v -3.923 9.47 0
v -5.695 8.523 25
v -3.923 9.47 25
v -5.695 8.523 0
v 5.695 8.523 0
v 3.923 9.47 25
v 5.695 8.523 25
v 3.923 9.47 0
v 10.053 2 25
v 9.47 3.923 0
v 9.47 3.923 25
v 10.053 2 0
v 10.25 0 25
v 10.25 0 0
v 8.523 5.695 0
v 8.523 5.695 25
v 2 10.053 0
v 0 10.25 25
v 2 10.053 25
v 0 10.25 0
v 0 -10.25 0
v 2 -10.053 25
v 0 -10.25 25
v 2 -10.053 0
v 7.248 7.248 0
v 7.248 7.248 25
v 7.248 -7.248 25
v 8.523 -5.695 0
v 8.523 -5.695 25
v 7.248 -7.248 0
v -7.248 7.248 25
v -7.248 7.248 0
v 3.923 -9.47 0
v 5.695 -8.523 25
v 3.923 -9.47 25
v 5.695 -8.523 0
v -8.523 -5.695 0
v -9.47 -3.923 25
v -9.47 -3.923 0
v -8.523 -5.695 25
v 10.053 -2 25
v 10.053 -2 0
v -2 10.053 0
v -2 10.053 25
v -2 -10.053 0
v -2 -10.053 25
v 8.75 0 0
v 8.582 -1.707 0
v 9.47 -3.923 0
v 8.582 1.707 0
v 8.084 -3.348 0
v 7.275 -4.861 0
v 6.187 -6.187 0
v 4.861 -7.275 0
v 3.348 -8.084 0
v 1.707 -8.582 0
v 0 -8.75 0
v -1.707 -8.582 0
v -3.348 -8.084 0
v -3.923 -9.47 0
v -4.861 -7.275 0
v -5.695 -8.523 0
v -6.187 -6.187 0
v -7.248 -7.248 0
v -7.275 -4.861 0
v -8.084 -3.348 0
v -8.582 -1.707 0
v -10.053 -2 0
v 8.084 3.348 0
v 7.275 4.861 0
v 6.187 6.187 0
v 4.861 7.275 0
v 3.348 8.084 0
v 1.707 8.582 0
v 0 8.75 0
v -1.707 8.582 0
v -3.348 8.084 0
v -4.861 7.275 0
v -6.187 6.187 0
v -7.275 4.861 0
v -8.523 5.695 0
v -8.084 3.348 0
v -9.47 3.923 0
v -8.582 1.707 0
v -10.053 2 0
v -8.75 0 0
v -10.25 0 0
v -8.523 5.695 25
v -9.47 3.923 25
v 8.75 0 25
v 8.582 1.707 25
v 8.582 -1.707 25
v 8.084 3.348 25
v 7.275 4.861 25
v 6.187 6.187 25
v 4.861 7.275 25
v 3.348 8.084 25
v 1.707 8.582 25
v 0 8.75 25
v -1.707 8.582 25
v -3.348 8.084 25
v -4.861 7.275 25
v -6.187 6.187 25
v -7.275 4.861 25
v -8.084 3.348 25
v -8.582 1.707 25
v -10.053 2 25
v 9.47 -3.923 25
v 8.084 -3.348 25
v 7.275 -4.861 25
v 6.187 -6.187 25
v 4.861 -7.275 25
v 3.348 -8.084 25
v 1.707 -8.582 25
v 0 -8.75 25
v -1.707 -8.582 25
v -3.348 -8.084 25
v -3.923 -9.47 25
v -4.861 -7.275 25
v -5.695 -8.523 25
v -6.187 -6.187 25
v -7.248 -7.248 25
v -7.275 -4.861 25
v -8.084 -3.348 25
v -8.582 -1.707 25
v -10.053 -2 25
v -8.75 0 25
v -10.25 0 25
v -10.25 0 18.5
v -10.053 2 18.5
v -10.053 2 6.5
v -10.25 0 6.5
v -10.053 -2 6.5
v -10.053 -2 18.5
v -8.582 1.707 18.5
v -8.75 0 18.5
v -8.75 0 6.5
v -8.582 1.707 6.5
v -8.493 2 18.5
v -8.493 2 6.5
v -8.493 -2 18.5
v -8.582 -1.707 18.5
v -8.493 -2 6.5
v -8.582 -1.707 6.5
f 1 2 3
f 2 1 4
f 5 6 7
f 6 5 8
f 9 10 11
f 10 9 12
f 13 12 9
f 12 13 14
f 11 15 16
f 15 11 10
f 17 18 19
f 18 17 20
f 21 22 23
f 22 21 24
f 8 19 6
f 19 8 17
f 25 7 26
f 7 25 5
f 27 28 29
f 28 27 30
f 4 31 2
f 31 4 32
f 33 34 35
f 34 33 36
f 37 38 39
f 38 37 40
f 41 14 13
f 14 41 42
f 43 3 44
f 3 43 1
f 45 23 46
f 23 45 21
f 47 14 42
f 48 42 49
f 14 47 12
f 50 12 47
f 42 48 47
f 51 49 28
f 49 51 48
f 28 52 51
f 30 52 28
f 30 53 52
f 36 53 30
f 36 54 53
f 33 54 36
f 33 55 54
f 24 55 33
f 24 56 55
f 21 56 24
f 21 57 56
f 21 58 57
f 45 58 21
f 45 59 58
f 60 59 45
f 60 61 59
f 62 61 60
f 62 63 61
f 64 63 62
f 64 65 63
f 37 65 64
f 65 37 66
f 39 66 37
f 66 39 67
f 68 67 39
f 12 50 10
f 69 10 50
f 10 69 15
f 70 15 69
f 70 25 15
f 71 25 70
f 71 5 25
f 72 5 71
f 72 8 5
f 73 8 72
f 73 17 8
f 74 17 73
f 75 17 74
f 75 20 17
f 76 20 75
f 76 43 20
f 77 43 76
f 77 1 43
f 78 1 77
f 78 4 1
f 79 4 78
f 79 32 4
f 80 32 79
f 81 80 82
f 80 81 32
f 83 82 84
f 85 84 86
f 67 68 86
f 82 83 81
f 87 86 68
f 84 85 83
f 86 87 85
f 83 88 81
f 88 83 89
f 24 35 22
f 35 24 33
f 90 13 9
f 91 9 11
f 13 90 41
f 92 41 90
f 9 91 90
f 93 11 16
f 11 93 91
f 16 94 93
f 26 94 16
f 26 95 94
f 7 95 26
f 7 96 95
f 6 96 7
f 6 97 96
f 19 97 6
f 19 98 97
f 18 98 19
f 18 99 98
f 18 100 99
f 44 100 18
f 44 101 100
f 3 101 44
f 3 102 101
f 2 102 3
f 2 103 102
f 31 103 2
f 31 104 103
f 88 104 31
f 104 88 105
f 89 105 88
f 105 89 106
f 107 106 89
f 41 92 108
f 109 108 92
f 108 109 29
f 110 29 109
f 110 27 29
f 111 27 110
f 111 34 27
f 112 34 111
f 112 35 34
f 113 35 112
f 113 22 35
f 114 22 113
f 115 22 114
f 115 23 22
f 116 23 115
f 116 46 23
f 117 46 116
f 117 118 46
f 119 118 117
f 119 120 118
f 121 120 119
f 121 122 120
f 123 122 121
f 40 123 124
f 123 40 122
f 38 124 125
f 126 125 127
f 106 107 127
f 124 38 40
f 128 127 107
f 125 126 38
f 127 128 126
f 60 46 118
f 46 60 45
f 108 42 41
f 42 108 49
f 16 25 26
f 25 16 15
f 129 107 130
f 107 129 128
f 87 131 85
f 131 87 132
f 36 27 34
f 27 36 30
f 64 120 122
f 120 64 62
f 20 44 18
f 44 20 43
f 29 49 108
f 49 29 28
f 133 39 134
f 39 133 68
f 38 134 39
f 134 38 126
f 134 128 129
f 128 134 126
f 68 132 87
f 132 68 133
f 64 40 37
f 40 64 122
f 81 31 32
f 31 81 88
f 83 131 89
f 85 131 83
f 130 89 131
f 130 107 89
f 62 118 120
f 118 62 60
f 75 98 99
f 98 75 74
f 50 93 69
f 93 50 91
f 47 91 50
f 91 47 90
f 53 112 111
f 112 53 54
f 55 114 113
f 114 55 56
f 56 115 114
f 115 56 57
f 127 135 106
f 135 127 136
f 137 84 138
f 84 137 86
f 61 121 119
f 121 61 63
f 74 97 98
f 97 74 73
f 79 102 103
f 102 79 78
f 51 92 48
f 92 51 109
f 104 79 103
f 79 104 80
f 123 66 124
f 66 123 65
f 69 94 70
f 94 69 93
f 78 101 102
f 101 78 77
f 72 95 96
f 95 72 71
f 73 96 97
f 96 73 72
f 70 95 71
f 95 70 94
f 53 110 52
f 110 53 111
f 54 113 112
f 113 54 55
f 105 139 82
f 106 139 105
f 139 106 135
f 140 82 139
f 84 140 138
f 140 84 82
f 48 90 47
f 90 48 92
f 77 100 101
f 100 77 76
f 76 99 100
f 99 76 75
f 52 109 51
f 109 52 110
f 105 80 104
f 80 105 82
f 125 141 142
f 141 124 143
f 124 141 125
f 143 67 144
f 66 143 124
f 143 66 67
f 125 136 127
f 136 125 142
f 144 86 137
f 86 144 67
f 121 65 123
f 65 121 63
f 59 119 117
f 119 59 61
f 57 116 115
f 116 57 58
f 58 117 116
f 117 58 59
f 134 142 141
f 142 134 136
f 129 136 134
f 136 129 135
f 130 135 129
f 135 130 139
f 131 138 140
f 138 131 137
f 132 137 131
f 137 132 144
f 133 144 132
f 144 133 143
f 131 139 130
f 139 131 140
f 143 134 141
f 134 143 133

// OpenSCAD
$fn = 32;

// ----------------------------------------------------------------------
// Spacer sleeve: 20.5 / 17.5 x 25 mm
// ----------------------------------------------------------------------

// --- parameters (mm) ---
sleeve_od = 20.5;         // outside diameter
sleeve_id = 17.5;         // shaft bore
sleeve_l = 25;            // sleeve length
slot_w = 4;               // clamp slot width
slot_len = 12;            // clamp slot length

module sleeve() {
  cylinder(h = sleeve_l, d = sleeve_od);
}

difference() {
  sleeve();
  translate([0, 0, -1]) cylinder(h = sleeve_l + 2, d = sleeve_id);
  translate([-sleeve_od / 2 - 1, -slot_w / 2, sleeve_l / 2 - slot_len / 2]) cube([sleeve_od / 2 + 1, slot_w, slot_len]);
}
